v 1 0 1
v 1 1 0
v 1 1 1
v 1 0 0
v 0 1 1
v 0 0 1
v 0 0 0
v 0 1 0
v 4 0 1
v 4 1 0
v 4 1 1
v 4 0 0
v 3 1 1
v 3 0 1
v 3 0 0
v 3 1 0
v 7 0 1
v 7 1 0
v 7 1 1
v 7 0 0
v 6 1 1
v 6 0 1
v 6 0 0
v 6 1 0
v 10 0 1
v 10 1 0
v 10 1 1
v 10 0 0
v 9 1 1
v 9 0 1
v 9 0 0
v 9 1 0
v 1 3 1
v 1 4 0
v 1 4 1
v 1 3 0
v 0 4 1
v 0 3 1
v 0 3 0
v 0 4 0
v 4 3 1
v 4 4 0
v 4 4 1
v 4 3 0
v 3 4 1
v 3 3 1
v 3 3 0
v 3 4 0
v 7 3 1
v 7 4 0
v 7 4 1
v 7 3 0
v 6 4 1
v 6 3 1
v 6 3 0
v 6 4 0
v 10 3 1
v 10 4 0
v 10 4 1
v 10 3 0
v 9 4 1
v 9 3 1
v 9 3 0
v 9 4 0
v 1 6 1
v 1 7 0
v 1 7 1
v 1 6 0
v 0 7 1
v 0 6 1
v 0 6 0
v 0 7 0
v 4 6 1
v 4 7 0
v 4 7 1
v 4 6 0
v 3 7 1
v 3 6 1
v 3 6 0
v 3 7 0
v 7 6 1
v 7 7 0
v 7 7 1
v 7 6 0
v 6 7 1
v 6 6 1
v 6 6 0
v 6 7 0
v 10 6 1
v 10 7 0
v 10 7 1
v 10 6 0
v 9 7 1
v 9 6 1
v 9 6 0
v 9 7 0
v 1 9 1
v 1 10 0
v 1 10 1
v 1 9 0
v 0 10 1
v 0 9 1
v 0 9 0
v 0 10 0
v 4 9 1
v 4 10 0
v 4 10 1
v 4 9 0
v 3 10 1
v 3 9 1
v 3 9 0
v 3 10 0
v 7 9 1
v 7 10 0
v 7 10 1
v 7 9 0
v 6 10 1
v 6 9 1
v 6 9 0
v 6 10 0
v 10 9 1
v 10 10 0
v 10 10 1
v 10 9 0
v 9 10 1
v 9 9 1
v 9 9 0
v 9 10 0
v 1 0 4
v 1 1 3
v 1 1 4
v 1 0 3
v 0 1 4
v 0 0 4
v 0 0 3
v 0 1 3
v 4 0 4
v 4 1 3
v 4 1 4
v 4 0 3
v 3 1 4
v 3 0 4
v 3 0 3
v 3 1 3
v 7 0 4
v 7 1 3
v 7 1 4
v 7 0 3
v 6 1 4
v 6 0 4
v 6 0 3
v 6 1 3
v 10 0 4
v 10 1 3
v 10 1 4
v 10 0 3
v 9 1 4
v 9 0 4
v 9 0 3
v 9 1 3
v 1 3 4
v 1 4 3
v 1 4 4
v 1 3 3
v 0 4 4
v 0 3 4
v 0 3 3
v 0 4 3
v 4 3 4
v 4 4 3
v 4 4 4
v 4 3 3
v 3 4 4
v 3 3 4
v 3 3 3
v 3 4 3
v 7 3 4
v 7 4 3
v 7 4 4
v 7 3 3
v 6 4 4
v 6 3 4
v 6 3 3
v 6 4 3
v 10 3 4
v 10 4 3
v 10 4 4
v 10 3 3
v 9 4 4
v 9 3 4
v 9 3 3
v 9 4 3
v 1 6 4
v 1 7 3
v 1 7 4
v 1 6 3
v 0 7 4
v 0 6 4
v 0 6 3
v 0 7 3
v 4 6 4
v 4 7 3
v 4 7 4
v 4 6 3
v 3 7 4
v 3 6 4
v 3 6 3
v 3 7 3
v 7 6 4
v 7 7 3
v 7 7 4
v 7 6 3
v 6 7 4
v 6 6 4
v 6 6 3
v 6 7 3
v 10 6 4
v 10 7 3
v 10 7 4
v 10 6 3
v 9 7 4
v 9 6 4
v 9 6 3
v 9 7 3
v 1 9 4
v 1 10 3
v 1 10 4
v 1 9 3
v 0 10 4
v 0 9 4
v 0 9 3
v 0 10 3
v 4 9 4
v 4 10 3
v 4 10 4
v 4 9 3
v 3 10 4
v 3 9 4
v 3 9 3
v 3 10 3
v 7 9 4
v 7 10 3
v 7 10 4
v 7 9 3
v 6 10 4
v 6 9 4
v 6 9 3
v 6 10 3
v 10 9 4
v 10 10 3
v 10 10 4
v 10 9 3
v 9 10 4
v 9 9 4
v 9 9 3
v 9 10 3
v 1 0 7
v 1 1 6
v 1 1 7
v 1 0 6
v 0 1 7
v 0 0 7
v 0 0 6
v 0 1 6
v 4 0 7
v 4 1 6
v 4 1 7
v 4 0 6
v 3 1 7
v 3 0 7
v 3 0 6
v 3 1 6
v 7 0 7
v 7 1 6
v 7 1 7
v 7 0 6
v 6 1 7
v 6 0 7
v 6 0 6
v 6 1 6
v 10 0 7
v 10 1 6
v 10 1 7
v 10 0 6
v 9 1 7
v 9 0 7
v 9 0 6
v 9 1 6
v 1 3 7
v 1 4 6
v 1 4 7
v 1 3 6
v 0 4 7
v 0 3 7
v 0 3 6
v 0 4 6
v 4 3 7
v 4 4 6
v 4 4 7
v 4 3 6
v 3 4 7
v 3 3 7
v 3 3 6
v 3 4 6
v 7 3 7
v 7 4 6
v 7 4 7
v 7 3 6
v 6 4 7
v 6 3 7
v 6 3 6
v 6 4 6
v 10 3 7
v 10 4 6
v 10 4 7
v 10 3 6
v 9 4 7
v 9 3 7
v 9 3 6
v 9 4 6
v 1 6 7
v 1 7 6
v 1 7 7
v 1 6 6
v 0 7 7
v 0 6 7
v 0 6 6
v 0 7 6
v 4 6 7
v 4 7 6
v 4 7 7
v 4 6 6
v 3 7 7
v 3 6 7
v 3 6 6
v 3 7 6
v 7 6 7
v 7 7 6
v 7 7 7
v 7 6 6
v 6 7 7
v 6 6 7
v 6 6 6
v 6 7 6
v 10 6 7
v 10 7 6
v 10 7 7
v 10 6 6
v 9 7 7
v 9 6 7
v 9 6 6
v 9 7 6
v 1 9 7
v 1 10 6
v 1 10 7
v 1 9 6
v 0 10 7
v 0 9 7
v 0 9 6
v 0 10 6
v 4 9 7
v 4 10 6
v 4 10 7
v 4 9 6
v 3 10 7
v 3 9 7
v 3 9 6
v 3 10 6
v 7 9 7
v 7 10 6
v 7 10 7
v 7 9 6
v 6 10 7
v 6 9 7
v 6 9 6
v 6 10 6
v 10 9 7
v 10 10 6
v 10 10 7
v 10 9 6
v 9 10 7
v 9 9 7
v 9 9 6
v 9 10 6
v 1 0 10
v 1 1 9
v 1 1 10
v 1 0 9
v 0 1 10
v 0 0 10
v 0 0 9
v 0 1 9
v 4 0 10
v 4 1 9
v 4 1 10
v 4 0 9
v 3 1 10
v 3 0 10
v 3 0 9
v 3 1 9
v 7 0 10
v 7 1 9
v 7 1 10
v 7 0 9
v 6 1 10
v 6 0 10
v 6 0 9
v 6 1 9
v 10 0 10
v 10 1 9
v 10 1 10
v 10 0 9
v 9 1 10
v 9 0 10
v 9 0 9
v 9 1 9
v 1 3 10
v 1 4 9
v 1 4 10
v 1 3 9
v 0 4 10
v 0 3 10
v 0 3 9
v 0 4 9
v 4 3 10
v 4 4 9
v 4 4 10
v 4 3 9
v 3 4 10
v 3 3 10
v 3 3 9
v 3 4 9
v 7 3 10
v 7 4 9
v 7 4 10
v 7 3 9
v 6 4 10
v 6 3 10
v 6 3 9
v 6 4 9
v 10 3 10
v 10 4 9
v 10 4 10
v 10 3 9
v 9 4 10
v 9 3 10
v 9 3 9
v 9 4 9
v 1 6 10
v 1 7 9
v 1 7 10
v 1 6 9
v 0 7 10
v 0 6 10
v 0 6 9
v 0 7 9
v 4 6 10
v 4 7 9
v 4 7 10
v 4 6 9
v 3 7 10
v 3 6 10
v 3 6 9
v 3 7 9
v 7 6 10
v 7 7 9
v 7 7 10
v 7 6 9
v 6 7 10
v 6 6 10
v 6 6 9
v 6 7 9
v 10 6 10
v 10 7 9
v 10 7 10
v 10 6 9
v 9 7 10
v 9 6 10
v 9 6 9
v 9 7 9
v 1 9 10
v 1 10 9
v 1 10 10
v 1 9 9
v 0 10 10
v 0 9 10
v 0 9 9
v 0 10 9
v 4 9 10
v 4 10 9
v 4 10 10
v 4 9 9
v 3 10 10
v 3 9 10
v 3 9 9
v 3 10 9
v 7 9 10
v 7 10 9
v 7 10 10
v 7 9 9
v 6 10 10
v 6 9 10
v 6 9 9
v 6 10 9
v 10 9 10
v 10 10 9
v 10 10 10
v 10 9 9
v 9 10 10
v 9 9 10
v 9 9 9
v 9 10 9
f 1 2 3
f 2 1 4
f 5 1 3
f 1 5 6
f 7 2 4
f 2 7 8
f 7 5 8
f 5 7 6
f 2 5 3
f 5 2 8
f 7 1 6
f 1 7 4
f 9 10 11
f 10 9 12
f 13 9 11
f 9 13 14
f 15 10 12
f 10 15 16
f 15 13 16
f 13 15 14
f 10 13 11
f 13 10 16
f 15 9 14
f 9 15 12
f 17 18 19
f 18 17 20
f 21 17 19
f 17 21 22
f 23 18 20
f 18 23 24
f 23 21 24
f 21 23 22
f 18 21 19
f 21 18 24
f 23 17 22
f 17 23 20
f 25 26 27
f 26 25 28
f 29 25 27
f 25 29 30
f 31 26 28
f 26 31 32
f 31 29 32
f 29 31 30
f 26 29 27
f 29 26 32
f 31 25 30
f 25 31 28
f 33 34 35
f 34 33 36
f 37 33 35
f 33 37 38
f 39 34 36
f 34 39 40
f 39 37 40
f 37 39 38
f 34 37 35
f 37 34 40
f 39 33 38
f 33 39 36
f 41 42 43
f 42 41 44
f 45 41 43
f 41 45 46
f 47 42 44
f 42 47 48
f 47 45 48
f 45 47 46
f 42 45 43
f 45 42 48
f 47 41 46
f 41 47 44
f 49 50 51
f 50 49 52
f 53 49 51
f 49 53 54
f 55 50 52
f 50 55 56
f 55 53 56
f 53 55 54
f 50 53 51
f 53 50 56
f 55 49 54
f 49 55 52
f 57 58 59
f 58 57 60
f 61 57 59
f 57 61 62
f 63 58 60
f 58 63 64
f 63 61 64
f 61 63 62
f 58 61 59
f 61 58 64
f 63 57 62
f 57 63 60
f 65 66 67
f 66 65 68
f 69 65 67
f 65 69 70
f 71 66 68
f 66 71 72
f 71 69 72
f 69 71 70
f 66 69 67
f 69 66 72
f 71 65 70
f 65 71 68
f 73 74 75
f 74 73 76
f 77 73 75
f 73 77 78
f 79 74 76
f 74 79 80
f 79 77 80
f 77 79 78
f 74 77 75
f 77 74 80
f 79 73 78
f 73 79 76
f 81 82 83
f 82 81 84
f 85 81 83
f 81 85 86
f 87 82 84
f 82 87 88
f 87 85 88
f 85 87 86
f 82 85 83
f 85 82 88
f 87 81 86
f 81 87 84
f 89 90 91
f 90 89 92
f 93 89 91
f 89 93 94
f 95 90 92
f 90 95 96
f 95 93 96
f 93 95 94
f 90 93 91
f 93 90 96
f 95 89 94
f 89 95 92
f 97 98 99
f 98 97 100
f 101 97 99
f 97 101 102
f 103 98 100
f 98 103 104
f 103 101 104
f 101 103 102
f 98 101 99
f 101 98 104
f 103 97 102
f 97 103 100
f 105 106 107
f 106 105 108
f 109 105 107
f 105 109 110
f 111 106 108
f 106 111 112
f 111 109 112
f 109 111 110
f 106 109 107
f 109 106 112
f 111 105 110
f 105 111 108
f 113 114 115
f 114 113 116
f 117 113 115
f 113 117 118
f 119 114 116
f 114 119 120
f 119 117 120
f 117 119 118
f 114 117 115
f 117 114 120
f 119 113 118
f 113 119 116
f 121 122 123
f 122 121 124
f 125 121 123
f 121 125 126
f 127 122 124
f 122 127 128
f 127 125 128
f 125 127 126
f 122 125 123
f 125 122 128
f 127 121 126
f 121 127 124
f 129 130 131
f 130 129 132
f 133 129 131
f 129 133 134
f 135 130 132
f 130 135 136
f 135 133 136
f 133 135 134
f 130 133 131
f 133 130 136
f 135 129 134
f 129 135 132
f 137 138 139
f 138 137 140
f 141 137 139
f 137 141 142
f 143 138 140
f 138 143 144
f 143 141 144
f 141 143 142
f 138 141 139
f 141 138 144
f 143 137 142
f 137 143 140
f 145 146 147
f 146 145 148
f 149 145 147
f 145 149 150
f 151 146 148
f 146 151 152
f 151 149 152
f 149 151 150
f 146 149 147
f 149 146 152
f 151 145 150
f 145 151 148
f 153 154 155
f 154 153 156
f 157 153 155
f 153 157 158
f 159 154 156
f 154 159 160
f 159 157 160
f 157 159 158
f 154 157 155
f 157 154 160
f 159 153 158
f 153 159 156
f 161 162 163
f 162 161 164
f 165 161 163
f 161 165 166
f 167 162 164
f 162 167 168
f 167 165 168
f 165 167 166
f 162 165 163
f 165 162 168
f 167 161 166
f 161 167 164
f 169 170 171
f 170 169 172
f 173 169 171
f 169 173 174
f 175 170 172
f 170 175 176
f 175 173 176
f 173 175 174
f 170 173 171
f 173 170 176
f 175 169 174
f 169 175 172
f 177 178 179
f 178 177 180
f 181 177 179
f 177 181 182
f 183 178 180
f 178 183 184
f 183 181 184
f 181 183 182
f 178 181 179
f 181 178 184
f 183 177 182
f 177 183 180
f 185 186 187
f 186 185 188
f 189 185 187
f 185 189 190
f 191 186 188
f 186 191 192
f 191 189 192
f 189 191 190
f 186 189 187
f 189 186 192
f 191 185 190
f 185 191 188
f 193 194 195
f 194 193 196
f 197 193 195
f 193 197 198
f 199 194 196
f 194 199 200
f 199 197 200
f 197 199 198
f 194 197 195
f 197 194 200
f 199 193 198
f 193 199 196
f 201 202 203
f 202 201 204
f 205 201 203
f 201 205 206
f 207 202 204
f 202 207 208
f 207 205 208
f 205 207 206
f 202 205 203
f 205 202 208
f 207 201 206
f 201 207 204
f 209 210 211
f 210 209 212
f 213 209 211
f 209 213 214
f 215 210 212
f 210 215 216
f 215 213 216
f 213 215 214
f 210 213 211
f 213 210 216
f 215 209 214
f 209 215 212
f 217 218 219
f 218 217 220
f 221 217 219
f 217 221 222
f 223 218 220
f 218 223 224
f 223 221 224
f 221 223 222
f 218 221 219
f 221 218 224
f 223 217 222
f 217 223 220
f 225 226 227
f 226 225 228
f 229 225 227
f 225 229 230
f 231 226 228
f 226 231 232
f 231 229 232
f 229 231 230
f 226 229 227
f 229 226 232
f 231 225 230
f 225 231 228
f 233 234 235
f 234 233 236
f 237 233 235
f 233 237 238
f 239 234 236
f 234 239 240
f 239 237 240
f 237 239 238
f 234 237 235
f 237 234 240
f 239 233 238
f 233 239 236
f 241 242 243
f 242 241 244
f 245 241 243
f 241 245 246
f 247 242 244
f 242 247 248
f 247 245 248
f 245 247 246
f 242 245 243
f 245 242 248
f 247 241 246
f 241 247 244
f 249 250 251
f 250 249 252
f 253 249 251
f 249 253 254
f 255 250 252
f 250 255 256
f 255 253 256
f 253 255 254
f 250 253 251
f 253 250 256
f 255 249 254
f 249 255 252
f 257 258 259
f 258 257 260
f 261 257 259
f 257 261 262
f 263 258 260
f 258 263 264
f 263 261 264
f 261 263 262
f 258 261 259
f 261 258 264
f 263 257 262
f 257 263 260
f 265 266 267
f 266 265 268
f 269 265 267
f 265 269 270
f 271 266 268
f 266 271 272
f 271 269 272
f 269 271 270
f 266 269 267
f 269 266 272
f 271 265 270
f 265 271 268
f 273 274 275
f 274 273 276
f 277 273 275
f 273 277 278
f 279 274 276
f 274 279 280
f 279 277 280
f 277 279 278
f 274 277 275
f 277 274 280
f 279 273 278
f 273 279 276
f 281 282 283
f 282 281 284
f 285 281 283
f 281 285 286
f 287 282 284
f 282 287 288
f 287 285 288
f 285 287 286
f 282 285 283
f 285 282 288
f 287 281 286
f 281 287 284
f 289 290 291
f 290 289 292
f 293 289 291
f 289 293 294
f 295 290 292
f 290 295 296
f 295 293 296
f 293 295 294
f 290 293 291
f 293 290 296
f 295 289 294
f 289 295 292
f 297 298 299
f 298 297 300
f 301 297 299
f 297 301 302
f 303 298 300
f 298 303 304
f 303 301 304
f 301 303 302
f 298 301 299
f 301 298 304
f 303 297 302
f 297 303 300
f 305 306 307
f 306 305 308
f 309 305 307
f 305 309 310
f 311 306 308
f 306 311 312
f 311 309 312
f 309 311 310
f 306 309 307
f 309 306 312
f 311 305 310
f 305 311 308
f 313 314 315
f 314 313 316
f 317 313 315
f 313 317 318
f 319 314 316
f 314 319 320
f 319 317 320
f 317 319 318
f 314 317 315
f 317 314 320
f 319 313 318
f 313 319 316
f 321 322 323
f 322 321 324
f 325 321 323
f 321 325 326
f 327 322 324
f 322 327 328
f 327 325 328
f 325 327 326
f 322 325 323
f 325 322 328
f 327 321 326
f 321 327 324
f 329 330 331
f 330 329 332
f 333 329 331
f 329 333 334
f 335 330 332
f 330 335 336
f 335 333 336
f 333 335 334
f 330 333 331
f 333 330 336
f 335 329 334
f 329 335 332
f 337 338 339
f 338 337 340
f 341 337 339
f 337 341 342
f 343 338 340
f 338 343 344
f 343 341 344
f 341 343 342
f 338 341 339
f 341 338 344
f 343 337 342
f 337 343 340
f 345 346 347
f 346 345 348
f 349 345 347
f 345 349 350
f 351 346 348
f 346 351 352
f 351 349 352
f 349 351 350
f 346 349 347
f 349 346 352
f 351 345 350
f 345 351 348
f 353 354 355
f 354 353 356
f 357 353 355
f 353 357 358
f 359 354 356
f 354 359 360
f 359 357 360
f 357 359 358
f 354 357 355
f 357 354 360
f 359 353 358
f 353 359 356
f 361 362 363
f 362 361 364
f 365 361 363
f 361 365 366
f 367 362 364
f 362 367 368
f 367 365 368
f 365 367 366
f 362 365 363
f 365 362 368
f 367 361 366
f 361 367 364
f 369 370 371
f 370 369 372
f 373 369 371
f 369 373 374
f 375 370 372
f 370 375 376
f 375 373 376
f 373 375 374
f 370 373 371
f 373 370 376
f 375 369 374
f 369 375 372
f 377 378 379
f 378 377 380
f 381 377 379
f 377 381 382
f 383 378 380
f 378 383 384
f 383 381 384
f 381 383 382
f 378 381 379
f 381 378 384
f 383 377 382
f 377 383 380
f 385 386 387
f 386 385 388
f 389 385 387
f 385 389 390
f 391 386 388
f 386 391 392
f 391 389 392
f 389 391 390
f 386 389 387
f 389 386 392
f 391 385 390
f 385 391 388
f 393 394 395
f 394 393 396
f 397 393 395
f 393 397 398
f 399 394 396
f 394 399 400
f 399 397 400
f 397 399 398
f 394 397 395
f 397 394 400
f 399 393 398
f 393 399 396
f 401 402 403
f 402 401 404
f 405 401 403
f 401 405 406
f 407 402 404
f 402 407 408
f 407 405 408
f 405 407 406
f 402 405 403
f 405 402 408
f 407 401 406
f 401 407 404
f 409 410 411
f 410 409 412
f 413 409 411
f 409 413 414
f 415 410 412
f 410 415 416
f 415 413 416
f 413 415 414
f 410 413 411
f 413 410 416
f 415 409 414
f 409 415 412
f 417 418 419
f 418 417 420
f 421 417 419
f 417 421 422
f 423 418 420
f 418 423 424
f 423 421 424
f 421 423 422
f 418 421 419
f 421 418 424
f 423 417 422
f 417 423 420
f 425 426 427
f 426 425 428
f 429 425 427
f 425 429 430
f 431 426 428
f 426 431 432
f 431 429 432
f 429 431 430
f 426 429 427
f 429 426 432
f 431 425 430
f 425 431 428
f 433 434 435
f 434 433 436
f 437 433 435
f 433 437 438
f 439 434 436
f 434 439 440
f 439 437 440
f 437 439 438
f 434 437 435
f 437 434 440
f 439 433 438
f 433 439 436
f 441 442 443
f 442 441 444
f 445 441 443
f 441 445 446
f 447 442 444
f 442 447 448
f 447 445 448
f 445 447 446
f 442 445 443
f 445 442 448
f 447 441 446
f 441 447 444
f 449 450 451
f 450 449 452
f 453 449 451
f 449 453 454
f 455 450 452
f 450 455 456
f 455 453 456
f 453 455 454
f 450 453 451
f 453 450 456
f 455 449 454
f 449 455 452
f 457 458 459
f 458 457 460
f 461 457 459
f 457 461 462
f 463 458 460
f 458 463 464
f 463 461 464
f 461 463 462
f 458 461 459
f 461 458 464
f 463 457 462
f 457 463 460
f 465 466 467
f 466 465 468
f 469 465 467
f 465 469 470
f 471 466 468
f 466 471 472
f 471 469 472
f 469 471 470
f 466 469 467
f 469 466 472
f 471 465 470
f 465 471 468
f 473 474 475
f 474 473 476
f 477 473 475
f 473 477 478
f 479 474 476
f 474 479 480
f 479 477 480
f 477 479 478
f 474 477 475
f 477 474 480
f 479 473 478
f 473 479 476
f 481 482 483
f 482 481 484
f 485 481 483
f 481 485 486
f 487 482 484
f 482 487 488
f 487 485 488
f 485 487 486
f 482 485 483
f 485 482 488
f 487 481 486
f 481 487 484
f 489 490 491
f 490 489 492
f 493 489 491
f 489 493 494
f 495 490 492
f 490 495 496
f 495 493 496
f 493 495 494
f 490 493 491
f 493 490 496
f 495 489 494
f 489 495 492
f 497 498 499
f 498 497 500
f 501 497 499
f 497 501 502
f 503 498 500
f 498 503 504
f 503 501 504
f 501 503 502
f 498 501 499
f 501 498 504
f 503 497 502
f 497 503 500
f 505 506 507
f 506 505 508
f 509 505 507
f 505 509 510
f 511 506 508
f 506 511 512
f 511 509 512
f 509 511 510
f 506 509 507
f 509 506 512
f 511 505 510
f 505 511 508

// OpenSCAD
for(h=[0:3:10])
{
for(g=[0:3:10])
{
for(i=[0:3:10])
{
translate([i,g,h]) cube([1,1,1]);
}
}
}
